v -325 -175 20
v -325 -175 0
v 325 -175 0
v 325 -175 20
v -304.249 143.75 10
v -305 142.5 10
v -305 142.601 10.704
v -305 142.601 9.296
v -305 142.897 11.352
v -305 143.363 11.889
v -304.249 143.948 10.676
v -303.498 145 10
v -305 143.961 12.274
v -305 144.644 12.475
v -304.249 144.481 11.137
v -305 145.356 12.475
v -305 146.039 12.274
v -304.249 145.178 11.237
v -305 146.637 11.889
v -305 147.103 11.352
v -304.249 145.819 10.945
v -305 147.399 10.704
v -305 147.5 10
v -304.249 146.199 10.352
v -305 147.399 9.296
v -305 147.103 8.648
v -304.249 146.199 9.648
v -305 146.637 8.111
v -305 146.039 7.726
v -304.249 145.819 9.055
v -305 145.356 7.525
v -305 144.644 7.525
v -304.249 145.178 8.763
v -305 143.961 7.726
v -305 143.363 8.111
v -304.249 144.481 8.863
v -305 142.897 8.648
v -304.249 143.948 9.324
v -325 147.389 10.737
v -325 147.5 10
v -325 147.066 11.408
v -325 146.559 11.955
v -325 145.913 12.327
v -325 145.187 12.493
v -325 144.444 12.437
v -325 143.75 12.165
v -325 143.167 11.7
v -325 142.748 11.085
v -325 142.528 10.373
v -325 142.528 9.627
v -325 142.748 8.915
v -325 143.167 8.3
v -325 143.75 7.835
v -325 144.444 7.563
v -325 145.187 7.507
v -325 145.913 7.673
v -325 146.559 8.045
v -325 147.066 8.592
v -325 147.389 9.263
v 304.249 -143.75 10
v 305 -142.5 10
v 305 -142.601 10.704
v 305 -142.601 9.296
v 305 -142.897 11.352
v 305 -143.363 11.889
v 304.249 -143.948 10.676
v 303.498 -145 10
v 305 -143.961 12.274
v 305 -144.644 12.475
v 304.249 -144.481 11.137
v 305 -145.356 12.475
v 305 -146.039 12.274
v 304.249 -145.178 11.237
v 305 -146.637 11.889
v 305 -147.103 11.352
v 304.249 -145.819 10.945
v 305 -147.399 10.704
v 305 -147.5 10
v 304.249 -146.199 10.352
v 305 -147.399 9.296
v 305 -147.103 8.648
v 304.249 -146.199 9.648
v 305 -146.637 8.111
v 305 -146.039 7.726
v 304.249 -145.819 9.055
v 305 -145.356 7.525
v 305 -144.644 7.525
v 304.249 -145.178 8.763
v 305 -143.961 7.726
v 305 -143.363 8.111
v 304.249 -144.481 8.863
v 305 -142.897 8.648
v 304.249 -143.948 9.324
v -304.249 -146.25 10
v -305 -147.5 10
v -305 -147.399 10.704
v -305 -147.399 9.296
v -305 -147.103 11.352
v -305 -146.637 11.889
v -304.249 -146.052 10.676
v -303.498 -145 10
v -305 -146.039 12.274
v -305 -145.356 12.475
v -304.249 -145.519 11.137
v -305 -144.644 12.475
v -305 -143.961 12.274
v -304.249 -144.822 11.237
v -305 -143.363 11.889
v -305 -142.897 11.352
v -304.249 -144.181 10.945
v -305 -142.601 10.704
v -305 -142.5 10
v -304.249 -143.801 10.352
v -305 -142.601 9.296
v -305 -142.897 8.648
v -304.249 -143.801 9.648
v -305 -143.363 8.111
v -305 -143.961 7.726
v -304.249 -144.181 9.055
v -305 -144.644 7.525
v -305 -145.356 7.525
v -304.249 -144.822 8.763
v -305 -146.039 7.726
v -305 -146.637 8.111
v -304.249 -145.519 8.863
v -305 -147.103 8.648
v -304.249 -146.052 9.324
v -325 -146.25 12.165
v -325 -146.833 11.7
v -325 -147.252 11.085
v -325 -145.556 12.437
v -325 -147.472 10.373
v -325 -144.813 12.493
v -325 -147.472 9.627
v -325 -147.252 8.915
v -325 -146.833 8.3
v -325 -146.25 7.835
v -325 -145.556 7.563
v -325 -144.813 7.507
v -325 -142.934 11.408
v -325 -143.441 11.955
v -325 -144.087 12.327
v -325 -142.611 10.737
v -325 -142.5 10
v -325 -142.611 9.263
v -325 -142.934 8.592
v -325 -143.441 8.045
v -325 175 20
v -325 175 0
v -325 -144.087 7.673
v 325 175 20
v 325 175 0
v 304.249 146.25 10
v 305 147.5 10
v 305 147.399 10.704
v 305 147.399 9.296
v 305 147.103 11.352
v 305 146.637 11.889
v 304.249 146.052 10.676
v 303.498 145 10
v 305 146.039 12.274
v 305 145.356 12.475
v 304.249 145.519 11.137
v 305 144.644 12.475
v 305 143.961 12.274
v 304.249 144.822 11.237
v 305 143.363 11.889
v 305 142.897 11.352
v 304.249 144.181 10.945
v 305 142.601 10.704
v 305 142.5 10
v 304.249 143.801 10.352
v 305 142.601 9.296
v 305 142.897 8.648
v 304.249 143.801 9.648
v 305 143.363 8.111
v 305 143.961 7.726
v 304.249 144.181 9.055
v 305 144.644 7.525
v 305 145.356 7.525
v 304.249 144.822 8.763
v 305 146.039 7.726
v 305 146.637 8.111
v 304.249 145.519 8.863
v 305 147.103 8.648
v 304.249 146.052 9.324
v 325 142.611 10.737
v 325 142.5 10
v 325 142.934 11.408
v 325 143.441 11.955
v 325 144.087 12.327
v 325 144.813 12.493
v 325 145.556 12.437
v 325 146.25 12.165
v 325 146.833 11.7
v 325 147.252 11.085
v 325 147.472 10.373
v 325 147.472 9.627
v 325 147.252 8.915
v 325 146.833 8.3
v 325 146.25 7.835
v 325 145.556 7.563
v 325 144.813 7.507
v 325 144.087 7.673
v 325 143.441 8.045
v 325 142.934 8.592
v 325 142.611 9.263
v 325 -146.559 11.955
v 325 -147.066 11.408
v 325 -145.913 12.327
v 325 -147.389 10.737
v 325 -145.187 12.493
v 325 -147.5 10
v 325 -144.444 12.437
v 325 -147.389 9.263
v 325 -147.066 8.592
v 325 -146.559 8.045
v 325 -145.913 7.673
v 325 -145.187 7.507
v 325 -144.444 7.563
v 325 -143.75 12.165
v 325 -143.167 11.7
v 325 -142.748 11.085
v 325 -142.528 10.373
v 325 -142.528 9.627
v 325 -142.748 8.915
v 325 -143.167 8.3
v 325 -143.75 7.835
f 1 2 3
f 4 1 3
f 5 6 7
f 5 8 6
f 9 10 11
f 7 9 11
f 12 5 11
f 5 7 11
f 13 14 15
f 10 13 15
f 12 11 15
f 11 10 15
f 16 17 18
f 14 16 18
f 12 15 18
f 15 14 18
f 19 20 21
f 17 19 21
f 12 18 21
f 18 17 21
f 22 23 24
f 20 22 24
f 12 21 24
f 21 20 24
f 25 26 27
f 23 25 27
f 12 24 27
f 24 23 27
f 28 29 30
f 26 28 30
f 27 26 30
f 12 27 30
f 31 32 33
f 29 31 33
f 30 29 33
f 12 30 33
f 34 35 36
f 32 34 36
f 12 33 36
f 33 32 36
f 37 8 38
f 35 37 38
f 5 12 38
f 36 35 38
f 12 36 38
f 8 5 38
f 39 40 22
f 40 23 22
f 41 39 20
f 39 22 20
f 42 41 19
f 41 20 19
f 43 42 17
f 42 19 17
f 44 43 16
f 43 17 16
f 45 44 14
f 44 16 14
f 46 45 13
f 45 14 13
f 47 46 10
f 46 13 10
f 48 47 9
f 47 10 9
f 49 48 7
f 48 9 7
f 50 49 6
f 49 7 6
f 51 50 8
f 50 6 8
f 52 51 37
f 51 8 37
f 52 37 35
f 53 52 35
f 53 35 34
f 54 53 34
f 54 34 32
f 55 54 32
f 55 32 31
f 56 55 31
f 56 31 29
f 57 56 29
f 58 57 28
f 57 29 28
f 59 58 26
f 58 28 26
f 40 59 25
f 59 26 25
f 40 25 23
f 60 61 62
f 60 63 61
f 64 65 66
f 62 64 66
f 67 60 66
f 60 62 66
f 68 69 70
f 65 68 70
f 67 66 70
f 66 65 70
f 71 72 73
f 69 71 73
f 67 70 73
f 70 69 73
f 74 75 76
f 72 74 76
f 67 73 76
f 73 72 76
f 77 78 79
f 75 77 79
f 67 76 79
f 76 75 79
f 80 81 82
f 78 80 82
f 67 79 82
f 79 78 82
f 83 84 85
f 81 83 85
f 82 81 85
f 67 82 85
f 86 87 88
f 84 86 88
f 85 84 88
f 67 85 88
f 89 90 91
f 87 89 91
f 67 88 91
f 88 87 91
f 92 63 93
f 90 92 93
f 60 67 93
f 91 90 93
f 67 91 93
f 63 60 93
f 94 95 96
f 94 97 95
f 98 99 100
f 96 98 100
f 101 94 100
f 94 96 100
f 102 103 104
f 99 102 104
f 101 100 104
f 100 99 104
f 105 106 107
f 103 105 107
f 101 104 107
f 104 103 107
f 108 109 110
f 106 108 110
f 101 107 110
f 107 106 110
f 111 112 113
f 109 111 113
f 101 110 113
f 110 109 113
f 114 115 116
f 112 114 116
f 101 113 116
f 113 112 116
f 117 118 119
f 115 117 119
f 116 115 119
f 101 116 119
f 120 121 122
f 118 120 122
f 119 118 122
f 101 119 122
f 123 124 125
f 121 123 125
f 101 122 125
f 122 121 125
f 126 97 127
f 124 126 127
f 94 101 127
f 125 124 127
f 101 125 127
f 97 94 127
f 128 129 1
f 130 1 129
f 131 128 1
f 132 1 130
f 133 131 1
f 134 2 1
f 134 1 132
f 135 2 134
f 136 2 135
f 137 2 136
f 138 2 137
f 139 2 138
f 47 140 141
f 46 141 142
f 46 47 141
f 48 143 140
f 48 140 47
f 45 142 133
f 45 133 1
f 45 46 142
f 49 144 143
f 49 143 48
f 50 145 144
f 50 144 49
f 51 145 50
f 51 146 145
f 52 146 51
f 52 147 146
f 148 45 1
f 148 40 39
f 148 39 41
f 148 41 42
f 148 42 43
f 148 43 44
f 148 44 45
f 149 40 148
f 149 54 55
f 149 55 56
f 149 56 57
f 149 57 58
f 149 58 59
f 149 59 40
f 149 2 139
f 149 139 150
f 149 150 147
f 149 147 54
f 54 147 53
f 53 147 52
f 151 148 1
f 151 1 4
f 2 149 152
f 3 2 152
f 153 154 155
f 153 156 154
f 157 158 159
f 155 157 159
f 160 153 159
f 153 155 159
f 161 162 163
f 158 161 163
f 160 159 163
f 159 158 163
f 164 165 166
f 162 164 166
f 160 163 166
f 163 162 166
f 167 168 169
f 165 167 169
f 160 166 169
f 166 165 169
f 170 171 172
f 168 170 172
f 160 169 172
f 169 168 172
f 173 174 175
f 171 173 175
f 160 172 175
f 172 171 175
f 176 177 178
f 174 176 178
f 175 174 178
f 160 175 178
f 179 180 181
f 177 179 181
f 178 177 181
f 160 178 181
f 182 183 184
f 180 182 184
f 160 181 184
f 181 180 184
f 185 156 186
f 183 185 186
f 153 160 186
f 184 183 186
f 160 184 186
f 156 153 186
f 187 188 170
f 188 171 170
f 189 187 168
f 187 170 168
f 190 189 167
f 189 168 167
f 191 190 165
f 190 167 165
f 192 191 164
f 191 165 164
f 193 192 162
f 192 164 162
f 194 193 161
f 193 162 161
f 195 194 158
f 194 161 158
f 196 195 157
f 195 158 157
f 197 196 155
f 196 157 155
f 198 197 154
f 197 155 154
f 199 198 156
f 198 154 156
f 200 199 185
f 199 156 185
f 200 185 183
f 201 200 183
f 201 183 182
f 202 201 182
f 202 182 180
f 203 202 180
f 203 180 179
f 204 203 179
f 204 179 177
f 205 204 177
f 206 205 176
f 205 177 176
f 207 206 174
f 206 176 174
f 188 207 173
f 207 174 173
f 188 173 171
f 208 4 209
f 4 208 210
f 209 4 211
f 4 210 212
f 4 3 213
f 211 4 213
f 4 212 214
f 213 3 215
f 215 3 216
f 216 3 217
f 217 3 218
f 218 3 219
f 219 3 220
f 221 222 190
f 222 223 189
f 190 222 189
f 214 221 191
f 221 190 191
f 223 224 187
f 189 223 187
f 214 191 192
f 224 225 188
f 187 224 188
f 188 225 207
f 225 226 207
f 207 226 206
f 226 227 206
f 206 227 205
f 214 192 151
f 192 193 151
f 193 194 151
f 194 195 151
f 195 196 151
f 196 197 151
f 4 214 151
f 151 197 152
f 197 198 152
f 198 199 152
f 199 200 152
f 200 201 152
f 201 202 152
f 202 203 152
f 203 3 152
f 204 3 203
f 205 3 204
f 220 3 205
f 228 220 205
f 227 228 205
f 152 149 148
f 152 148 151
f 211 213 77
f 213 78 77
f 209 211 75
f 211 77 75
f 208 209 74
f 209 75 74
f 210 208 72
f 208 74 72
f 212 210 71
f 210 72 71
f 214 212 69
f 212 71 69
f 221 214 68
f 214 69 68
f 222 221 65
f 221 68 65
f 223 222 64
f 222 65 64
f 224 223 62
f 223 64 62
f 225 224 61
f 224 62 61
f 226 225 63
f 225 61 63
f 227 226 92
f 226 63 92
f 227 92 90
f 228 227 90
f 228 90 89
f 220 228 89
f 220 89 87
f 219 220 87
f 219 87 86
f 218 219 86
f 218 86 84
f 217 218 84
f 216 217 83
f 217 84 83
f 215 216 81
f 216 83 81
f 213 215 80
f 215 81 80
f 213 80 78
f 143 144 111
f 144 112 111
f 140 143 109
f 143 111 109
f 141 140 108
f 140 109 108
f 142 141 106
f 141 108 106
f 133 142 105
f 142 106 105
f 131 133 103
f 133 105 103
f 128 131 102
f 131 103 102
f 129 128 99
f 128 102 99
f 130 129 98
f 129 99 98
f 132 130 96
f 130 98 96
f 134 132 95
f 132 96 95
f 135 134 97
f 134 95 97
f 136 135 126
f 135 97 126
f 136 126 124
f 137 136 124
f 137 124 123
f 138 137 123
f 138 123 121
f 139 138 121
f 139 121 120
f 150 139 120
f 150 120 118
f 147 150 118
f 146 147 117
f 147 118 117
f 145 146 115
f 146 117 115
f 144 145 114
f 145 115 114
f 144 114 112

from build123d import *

# Parameters (mm, degrees)
F0_W           = 650
F0_H           = 350
F1_DEPTH       = 20
F4_D           = 5
F4_DEPTH       = 20
F4_TIP         = 1.5021515476
F4_ON_F3_D     = 5
F4_ON_F3_DEPTH = 20
F4_ON_F3_TIP   = 1.5021515476


with BuildPart() as f1:
    # F0 (on Top) → F1 (new body)
    with BuildSketch(Plane.XY):
        Rectangle(F0_W, F0_H)
    extrude(amount=F1_DEPTH)

    # F4
    with Locations(Plane(origin=(-325, 0, 0), x_dir=(0, -1, 0), z_dir=(-1, 0, 0))):
        with Locations((-145, 10), (145, 10)):
            Hole(F4_D / 2, depth=F4_DEPTH)
            with Locations((0, 0, -(F4_DEPTH + F4_TIP / 2))):  # 118° drill point
                Cone(0, F4_D / 2, F4_TIP, mode=Mode.SUBTRACT)

    # F4 on F3
    with Locations(Plane.YZ.offset(325)):
        with Locations((-145, 10), (145, 10)):
            Hole(F4_ON_F3_D / 2, depth=F4_ON_F3_DEPTH)
            with Locations((0, 0, -(F4_ON_F3_DEPTH + F4_ON_F3_TIP / 2))):  # 118° drill point
                Cone(0, F4_ON_F3_D / 2, F4_ON_F3_TIP, mode=Mode.SUBTRACT)


solid = f1.part
